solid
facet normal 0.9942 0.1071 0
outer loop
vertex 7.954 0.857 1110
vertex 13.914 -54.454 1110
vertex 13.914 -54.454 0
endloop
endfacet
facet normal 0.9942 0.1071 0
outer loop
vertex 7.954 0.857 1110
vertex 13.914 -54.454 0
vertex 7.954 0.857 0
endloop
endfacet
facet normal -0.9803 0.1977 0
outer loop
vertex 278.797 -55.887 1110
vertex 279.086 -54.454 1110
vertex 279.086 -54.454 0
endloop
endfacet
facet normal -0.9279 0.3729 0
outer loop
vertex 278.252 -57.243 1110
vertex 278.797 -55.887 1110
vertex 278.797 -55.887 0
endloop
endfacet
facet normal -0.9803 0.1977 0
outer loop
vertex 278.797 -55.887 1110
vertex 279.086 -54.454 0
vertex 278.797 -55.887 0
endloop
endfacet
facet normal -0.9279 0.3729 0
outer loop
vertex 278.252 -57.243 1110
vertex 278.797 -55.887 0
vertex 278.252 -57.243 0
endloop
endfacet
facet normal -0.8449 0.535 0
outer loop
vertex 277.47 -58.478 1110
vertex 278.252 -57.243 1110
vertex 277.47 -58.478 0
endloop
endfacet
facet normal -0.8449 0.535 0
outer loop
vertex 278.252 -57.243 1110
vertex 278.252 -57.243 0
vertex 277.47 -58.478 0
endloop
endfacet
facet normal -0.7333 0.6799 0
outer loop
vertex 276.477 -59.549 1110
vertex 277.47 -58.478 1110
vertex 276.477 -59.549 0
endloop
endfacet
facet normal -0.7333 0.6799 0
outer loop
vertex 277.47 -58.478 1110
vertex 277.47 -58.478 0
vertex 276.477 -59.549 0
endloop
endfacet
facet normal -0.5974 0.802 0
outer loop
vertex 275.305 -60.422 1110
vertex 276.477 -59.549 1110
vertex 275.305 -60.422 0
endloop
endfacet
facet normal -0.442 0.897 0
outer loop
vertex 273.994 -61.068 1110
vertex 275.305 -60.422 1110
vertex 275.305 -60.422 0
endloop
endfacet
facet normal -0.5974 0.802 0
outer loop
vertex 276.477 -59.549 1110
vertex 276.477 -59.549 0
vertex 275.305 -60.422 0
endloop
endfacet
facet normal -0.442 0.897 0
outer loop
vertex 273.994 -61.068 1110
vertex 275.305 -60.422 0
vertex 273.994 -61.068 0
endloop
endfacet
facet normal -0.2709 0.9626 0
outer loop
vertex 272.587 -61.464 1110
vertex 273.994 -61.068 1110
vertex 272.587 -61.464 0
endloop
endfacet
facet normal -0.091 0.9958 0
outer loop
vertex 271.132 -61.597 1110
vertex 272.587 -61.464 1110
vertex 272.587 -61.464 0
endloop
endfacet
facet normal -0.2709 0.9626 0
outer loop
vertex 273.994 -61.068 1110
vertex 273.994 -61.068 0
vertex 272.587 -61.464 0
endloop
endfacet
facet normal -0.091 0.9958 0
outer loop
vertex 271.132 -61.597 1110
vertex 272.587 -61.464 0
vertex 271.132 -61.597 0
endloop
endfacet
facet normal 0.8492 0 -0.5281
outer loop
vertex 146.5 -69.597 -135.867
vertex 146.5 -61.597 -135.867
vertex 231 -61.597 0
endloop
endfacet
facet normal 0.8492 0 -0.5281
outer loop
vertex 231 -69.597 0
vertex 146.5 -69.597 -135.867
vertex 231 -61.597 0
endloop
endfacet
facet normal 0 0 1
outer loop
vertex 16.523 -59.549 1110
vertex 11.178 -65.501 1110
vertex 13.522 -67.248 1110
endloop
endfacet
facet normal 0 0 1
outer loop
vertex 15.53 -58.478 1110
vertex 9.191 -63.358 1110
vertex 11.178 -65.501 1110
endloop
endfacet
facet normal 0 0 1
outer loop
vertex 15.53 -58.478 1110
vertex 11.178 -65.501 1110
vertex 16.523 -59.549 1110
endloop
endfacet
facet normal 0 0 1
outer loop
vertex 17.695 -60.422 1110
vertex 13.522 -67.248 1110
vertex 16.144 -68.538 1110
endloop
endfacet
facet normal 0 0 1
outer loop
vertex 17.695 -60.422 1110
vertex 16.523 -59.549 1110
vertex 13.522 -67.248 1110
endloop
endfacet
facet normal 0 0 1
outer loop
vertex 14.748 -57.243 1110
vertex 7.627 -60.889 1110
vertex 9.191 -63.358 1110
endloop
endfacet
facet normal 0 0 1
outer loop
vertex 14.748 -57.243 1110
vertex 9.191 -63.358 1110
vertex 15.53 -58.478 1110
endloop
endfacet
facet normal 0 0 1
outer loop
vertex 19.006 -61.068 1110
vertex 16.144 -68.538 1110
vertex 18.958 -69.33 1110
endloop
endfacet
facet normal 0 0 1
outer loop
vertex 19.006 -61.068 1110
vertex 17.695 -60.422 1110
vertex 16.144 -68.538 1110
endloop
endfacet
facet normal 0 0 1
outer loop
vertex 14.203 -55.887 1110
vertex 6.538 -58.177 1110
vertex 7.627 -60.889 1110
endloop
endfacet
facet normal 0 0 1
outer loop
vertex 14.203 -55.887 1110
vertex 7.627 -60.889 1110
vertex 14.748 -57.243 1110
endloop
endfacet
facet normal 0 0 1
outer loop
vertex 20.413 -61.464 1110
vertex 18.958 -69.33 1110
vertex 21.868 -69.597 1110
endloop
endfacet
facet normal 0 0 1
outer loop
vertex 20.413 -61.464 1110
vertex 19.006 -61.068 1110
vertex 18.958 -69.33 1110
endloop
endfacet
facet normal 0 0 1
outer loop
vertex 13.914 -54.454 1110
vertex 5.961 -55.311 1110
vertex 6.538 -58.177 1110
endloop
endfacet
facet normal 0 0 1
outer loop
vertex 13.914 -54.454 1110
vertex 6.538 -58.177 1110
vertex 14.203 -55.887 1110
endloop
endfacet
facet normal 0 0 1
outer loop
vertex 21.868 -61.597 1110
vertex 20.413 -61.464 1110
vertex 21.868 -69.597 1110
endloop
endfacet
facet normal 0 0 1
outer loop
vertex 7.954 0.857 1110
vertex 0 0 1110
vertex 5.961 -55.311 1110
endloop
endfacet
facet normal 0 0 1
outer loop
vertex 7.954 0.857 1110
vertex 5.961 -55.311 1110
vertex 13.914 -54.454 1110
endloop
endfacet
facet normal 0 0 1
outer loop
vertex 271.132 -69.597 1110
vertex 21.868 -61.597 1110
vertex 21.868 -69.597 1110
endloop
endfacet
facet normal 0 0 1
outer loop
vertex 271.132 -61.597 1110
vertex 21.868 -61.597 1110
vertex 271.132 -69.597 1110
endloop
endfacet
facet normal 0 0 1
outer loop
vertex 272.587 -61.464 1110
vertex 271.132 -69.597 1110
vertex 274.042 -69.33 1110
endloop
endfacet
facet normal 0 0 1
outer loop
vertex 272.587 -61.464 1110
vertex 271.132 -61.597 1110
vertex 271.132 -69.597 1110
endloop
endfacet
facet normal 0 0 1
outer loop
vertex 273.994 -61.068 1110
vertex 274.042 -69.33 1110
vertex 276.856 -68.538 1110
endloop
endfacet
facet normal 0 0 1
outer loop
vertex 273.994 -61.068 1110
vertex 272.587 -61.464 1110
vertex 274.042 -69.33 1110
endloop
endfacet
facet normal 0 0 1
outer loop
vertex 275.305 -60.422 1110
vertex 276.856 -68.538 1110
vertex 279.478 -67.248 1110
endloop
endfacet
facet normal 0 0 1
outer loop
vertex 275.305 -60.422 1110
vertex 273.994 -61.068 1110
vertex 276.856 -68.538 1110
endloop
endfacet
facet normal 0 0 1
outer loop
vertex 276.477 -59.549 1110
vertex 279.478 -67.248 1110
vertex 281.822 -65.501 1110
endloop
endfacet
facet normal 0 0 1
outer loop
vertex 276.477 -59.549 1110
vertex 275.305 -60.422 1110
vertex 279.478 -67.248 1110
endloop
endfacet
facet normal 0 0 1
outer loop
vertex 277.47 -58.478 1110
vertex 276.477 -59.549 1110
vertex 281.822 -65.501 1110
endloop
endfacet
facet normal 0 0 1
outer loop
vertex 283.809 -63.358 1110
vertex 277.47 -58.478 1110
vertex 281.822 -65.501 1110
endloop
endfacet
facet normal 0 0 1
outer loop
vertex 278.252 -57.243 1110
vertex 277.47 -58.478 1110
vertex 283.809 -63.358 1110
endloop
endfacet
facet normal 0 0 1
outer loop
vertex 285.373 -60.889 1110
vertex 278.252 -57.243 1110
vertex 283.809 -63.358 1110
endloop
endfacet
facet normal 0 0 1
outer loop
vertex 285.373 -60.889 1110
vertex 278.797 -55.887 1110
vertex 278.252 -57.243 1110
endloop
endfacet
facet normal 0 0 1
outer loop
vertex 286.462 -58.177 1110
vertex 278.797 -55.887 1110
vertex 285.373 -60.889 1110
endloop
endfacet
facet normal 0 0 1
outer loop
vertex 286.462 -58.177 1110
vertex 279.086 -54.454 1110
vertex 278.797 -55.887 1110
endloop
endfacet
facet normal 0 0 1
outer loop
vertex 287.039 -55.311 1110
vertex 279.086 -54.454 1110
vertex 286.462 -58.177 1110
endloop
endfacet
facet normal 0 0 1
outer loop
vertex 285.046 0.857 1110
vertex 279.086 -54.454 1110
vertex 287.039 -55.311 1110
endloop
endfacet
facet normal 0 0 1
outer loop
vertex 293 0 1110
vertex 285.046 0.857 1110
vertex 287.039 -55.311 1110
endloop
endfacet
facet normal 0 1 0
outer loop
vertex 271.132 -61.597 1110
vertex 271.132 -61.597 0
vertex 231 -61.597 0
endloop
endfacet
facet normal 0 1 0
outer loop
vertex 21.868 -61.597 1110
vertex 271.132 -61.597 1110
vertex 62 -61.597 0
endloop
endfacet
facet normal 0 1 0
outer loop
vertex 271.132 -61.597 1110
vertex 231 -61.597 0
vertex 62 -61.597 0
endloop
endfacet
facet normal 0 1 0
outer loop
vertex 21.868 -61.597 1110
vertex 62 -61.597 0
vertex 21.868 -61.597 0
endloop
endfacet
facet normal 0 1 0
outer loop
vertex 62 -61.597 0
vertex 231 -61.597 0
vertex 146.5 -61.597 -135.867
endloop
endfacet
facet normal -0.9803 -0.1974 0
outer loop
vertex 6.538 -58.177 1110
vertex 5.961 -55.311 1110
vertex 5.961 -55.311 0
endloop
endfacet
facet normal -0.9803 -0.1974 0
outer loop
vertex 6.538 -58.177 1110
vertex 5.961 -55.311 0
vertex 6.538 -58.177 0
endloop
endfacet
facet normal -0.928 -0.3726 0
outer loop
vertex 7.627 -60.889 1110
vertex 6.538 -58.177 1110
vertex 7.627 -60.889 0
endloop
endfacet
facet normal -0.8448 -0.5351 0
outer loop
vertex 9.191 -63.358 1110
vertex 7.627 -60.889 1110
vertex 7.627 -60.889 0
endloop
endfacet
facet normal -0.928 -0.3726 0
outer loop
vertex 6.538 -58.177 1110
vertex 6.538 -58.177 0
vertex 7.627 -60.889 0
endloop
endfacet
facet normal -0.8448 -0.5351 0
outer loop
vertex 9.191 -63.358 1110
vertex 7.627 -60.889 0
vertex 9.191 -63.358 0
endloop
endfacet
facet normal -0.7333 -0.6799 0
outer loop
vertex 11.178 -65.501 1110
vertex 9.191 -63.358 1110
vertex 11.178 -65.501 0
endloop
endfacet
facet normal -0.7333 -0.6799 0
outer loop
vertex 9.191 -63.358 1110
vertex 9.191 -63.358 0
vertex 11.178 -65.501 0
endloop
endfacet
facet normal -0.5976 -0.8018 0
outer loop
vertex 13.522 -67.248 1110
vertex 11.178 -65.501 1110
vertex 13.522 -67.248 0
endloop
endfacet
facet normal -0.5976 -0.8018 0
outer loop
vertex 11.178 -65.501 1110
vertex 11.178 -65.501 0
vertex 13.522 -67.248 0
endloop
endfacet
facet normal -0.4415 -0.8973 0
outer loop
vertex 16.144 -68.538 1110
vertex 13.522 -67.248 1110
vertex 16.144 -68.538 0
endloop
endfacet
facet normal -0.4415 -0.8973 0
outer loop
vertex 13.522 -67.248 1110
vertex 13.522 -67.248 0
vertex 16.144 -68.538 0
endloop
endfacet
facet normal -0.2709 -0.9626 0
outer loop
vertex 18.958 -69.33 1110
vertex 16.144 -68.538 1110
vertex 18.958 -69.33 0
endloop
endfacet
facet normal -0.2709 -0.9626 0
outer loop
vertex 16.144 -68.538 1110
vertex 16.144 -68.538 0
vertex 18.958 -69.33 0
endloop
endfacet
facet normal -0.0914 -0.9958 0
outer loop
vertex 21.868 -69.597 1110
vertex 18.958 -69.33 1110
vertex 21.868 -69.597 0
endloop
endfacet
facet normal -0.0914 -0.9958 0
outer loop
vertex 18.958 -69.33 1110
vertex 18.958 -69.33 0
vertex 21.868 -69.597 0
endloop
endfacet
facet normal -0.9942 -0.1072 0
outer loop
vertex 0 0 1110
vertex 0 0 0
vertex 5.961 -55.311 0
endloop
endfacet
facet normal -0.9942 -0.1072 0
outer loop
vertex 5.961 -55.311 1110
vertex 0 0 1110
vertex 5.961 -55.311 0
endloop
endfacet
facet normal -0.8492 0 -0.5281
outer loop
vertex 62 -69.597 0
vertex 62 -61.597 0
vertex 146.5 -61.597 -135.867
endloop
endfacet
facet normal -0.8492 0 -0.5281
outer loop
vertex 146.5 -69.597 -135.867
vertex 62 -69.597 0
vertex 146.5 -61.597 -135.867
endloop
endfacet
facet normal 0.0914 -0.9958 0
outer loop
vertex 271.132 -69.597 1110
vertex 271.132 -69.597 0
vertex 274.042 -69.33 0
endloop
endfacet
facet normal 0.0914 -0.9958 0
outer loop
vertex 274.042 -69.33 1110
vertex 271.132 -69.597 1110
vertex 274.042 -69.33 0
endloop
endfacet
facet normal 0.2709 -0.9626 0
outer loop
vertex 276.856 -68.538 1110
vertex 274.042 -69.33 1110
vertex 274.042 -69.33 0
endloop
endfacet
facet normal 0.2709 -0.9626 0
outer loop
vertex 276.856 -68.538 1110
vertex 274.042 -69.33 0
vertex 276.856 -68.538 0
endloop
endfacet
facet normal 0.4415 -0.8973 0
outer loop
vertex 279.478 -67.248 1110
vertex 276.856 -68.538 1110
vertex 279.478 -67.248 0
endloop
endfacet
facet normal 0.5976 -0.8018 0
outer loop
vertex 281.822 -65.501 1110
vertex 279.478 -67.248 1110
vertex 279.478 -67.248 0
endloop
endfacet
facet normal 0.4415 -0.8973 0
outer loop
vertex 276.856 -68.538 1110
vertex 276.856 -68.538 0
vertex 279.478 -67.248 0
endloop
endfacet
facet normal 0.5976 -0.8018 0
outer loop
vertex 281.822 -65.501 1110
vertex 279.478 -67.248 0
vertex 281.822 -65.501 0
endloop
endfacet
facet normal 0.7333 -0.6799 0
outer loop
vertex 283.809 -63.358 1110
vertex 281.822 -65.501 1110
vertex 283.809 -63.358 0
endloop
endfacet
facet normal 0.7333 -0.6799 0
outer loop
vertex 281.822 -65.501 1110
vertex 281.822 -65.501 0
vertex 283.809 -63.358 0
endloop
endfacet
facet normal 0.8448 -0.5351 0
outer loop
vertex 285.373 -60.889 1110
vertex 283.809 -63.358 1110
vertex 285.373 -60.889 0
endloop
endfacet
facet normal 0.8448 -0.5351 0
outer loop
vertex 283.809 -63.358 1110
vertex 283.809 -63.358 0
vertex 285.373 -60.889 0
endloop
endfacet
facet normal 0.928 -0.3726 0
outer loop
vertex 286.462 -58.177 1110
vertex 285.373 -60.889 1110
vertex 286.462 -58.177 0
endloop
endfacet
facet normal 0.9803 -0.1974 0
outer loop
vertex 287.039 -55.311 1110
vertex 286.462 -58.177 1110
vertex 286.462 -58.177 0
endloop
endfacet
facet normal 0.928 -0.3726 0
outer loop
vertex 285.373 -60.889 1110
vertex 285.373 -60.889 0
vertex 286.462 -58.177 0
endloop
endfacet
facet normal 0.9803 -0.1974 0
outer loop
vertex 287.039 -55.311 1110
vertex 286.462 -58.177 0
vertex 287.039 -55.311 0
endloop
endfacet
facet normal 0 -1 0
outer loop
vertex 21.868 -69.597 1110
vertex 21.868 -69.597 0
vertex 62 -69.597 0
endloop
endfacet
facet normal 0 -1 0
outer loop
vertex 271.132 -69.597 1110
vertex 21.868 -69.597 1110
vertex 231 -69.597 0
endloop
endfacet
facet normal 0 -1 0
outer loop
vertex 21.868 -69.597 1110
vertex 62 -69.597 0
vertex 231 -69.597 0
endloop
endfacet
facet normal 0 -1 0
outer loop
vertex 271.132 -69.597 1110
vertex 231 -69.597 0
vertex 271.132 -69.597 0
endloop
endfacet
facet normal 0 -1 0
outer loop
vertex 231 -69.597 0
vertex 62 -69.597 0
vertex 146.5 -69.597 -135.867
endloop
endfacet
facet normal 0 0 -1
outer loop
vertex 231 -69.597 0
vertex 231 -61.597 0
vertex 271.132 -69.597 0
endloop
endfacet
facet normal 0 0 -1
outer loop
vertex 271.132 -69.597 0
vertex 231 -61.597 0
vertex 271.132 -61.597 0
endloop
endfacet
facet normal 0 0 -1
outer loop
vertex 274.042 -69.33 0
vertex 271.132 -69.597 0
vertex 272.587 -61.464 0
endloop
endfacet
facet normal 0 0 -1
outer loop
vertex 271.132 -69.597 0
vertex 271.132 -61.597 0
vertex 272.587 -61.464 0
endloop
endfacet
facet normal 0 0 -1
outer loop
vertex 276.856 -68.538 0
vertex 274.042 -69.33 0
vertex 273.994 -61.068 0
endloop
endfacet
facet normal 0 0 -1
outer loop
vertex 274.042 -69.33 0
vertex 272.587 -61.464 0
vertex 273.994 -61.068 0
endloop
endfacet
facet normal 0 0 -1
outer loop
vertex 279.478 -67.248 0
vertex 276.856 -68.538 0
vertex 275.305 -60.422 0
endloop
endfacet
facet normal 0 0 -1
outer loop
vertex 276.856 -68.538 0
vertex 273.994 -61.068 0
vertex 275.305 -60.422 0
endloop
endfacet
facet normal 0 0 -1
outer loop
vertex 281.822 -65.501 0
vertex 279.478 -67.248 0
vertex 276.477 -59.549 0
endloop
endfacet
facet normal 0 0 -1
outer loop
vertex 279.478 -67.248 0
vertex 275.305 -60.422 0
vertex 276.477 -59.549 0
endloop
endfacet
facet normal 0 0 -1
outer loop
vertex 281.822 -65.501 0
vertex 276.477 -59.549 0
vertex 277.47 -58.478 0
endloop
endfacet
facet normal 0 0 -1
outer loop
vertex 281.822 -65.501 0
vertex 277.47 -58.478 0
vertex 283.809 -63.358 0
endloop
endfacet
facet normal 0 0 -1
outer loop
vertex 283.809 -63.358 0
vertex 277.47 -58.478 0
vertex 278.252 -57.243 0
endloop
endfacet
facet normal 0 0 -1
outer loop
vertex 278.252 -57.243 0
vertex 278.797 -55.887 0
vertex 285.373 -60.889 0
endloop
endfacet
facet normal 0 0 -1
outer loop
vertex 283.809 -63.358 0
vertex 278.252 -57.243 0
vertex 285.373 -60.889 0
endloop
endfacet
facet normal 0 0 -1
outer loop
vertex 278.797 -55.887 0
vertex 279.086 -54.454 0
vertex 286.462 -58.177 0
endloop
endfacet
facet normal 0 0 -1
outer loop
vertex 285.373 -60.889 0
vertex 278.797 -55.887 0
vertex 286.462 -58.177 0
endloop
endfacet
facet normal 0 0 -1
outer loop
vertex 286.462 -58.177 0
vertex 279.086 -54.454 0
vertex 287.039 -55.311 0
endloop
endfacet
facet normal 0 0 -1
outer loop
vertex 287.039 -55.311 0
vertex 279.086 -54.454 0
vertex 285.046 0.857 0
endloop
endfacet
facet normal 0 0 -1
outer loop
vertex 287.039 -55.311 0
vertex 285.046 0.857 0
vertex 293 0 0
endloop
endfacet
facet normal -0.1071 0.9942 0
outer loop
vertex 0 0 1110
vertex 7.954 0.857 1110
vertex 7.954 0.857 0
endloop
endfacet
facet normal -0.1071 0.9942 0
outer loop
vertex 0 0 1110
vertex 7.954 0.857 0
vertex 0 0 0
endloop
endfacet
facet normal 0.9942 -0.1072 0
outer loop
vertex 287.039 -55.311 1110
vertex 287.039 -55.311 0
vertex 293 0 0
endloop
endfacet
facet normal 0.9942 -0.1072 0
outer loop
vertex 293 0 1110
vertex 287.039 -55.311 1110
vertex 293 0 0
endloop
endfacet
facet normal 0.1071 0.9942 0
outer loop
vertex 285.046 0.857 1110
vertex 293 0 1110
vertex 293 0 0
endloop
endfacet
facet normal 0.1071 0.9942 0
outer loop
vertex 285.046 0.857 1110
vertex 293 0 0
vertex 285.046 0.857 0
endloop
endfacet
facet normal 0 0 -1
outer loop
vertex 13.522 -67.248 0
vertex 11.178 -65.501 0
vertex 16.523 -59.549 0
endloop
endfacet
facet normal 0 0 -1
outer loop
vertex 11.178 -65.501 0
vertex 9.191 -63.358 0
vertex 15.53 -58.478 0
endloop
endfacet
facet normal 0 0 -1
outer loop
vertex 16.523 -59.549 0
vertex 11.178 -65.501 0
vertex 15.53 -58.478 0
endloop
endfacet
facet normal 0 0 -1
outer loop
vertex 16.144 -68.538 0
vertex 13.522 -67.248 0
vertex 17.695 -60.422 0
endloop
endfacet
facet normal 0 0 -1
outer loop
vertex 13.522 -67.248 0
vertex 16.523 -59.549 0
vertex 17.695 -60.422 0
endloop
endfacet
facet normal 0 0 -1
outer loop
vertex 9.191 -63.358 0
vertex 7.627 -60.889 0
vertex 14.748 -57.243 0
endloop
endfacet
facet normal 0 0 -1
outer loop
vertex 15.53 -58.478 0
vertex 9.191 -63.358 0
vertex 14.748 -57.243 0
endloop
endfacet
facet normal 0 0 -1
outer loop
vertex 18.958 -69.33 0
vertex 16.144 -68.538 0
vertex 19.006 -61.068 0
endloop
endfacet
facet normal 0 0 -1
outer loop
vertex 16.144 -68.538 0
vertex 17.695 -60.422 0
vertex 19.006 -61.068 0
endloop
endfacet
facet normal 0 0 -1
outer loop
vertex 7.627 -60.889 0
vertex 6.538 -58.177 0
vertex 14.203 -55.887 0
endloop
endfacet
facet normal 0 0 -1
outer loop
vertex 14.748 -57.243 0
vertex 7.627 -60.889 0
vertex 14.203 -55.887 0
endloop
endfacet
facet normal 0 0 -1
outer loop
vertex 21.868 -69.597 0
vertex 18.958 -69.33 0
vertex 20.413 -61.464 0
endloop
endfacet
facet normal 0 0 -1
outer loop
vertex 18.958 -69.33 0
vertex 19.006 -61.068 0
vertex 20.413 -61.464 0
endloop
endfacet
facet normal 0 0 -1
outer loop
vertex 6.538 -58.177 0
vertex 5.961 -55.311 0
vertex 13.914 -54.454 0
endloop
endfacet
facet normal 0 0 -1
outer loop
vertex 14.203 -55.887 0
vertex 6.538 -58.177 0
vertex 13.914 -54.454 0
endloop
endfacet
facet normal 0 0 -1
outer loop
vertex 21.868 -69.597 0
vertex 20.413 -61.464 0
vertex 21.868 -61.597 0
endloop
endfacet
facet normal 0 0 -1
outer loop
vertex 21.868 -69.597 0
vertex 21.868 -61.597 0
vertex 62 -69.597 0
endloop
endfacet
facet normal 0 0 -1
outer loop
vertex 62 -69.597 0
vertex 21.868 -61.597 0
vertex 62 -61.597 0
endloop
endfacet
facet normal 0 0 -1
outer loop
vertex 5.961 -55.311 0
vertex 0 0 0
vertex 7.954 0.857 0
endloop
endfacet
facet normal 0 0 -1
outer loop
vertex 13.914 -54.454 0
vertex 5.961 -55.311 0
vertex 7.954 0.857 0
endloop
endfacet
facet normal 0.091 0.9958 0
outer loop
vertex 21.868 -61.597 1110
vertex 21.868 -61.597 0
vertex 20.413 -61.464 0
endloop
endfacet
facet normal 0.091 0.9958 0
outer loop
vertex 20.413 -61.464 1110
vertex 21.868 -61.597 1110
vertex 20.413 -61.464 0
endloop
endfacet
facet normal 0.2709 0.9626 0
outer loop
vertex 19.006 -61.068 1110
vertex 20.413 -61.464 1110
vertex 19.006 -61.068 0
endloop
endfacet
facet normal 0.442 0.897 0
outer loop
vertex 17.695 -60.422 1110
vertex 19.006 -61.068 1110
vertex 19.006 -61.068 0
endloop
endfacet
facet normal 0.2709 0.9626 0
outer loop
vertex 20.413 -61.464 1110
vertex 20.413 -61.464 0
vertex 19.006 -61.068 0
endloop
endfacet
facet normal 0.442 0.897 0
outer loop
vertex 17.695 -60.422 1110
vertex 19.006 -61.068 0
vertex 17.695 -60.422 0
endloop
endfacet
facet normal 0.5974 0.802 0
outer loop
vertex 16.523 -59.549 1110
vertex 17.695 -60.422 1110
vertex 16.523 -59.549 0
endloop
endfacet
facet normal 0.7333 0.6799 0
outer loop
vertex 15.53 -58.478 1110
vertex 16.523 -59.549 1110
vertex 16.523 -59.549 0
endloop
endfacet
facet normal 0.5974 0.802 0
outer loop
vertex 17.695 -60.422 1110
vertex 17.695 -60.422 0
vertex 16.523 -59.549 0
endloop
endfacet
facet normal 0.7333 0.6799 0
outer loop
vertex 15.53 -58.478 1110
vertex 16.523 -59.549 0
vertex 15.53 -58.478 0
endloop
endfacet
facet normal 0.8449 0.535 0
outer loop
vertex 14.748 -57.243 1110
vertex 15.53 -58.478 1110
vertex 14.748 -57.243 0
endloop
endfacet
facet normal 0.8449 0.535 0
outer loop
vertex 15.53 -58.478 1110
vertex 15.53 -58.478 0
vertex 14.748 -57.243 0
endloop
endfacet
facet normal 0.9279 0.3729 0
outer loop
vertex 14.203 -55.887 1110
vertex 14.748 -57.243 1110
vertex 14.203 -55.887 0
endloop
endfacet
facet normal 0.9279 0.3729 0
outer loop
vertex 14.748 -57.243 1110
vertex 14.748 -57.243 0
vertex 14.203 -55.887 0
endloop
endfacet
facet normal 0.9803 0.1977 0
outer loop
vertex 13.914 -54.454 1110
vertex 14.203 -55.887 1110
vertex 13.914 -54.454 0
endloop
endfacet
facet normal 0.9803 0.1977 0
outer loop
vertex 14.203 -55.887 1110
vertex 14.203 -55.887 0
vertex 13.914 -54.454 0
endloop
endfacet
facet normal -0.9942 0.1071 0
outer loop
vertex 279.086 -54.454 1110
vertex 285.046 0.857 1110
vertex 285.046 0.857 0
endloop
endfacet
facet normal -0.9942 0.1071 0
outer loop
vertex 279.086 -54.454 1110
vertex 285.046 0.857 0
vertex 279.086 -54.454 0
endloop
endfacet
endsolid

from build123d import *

# Parameters (mm, degrees)
TABAN_FLAN_1_DEPTH = 1110
SEKME1_DEPTH       = 8


# Sheet-metal steps are written as plain solids
with BuildPart() as part:
    # Çizim1 → Taban-Flanş1 (new body)
    with BuildSketch(Plane.XY):
        with BuildLine():
            Line((0, 0), (5.960525983, -55.31134025))
            ThreePointArc((5.960525983, -55.31134025), (11.177974486, -65.501435482), (21.868424162, -69.597054535))
            Line((21.868424162, -69.597054535), (271.131575838, -69.597054535))
            ThreePointArc((271.131575838, -69.597054535), (281.822025514, -65.501435482), (287.039474017, -55.31134025))
            Line((287.039474017, -55.31134025), (293, 0))
            Line((293, 0), (285.04605091, 0.857142857))
            Line((285.04605091, 0.857142857), (279.085524928, -54.454197393))
            ThreePointArc((279.085524928, -54.454197393), (276.476800676, -59.549245009), (271.131575838, -61.597054535))
            Line((271.131575838, -61.597054535), (21.868424162, -61.597054535))
            ThreePointArc((21.868424162, -61.597054535), (16.523199324, -59.549245009), (13.914475072, -54.454197393))
            Line((13.914475072, -54.454197393), (7.95394909, 0.857142857))
            Line((7.95394909, 0.857142857), (0, 0))
        make_face()
    extrude(amount=TABAN_FLAN_1_DEPTH)

    # Çizim6 → Sekme1 (add)
    with BuildSketch(Plane(origin=(0, -61.597054535, 0), x_dir=(1, 0, 0), z_dir=(0, 1, 0))):
        Polygon((62, 0), (146.5, 135.866662578), (231, 0), align=None)
    extrude(amount=-SEKME1_DEPTH)


solid = part.part
